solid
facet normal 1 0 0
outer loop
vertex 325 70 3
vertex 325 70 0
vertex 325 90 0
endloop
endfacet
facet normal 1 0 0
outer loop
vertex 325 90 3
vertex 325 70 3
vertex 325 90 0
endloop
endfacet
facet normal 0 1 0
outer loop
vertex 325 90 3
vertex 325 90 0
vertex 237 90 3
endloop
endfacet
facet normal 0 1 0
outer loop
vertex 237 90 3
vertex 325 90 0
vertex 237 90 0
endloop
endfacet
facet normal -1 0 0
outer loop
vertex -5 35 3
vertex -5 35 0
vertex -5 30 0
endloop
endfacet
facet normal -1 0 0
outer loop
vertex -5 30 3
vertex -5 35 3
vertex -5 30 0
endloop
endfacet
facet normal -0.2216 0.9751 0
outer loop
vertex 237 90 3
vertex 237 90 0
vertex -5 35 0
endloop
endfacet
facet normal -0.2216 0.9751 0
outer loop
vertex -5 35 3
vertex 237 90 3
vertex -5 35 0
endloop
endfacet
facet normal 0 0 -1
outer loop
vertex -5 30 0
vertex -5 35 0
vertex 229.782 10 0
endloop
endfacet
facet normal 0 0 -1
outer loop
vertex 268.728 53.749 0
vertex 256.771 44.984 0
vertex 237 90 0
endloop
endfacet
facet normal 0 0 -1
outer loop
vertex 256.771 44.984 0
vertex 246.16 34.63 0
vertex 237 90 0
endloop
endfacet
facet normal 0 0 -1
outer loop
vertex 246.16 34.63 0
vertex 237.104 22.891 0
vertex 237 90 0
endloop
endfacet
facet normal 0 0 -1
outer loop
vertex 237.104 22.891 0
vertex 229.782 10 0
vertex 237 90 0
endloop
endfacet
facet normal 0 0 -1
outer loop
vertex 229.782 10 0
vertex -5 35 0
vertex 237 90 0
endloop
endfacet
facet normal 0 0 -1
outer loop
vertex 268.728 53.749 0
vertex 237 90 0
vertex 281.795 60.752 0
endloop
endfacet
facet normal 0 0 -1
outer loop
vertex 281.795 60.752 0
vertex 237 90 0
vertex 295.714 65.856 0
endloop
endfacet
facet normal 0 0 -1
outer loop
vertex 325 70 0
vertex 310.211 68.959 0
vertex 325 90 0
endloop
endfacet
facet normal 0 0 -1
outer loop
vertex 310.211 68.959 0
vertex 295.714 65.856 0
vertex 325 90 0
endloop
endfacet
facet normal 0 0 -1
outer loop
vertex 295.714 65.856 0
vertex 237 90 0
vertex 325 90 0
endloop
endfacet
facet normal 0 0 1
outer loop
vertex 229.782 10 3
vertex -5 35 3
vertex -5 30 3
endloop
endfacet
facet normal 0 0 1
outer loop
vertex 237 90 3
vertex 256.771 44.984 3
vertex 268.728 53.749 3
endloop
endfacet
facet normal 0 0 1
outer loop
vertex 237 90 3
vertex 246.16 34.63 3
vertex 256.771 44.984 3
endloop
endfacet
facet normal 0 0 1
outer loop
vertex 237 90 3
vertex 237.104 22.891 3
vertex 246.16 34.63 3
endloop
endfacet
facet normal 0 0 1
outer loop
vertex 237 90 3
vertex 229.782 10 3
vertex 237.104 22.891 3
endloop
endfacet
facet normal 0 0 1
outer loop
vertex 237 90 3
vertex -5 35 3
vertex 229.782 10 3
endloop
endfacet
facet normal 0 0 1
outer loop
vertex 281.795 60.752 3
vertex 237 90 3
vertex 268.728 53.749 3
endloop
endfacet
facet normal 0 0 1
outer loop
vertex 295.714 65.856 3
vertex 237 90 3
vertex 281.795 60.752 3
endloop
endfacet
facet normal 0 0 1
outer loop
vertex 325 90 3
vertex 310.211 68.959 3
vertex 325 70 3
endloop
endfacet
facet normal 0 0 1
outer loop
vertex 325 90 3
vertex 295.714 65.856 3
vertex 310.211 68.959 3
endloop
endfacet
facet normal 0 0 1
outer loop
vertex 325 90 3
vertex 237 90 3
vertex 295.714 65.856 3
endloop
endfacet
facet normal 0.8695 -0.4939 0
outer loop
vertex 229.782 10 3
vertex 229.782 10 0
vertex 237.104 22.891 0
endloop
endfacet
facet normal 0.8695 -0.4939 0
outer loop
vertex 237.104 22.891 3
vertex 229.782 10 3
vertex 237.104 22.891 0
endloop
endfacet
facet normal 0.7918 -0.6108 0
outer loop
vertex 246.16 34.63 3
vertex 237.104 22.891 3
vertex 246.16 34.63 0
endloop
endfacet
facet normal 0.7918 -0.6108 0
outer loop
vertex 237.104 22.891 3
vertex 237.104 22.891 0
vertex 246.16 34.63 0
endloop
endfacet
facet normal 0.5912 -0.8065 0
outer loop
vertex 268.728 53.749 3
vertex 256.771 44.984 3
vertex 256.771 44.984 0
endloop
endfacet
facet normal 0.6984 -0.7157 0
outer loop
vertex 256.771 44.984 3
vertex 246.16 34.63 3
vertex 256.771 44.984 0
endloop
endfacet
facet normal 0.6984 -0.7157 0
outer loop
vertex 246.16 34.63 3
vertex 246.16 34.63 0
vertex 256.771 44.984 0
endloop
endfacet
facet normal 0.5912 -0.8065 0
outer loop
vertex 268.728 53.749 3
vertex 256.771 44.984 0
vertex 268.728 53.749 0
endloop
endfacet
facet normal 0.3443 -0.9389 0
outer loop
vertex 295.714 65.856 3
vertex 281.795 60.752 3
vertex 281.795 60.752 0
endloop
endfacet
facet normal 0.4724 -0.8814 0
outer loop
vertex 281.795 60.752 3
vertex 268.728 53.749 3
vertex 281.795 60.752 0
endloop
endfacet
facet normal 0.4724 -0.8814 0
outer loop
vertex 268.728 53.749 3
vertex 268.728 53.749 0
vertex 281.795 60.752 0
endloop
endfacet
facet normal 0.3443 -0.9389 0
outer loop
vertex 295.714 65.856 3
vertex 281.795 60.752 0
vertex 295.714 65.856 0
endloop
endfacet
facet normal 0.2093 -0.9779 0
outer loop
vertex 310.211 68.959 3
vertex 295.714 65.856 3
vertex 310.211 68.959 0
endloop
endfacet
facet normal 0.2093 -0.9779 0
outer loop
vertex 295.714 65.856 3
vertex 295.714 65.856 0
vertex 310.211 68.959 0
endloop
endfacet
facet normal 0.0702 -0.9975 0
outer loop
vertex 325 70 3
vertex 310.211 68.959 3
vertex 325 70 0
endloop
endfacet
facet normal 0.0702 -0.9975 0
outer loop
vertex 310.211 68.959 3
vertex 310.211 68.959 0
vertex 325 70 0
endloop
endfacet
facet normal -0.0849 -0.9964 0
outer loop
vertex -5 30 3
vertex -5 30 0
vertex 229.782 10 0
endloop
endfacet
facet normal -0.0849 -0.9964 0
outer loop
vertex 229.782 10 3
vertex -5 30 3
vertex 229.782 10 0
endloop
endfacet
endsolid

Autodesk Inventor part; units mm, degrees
ref_plane "YZ Plane" through (0, 0, 0) normal (1, 0, 0) x (0, 1, 0)
ref_plane "XZ Plane" through (0, 0, 0) normal (0, 1, 0) x (-1, 0, 0)
ref_plane "XY Plane" through (0, 0, 0) normal (0, 0, 1) x (1, 0, 0)
sketch "Skizze1" plane through (0, 0, 0) normal (0, 0, 1) x (1, 0, 0)
  line L0 (-71, 0) -> (391, 0) projected
  line L1 (-5, 35) -> (-5, 30)
  line L2 (-5, 30) -> (229.7825, 10)
  line L3 (325, 70) -> (325, 110)
  line L4 (325, 110) -> (-5, 35)
  arc A0 (325, 70) -> (229.7825, 10) centre (325, -35.5531) ccw
  line L5 (325, 90) -> (237, 90)
  point P0 (0, 0)
  dimension "d3" = 5
  dimension "d5" = 330
  dimension "d6" = 40
  dimension "d7" = 5
  dimension "d8" = 30
  dimension "d9" = 230
  dimension "d13" = 10
  dimension "d14" = 70
extrude "Extrusion1" add sketch "Skizze1" along normal blind 3 contours L4 L5 L3 A0 L2 L1
equation "\"G_L\" = 0"
equation "\"G_H\" = 0"
equation "\"G_B\" = 0"
properties part number "Center_fin" material "GEDA Polyamid"
